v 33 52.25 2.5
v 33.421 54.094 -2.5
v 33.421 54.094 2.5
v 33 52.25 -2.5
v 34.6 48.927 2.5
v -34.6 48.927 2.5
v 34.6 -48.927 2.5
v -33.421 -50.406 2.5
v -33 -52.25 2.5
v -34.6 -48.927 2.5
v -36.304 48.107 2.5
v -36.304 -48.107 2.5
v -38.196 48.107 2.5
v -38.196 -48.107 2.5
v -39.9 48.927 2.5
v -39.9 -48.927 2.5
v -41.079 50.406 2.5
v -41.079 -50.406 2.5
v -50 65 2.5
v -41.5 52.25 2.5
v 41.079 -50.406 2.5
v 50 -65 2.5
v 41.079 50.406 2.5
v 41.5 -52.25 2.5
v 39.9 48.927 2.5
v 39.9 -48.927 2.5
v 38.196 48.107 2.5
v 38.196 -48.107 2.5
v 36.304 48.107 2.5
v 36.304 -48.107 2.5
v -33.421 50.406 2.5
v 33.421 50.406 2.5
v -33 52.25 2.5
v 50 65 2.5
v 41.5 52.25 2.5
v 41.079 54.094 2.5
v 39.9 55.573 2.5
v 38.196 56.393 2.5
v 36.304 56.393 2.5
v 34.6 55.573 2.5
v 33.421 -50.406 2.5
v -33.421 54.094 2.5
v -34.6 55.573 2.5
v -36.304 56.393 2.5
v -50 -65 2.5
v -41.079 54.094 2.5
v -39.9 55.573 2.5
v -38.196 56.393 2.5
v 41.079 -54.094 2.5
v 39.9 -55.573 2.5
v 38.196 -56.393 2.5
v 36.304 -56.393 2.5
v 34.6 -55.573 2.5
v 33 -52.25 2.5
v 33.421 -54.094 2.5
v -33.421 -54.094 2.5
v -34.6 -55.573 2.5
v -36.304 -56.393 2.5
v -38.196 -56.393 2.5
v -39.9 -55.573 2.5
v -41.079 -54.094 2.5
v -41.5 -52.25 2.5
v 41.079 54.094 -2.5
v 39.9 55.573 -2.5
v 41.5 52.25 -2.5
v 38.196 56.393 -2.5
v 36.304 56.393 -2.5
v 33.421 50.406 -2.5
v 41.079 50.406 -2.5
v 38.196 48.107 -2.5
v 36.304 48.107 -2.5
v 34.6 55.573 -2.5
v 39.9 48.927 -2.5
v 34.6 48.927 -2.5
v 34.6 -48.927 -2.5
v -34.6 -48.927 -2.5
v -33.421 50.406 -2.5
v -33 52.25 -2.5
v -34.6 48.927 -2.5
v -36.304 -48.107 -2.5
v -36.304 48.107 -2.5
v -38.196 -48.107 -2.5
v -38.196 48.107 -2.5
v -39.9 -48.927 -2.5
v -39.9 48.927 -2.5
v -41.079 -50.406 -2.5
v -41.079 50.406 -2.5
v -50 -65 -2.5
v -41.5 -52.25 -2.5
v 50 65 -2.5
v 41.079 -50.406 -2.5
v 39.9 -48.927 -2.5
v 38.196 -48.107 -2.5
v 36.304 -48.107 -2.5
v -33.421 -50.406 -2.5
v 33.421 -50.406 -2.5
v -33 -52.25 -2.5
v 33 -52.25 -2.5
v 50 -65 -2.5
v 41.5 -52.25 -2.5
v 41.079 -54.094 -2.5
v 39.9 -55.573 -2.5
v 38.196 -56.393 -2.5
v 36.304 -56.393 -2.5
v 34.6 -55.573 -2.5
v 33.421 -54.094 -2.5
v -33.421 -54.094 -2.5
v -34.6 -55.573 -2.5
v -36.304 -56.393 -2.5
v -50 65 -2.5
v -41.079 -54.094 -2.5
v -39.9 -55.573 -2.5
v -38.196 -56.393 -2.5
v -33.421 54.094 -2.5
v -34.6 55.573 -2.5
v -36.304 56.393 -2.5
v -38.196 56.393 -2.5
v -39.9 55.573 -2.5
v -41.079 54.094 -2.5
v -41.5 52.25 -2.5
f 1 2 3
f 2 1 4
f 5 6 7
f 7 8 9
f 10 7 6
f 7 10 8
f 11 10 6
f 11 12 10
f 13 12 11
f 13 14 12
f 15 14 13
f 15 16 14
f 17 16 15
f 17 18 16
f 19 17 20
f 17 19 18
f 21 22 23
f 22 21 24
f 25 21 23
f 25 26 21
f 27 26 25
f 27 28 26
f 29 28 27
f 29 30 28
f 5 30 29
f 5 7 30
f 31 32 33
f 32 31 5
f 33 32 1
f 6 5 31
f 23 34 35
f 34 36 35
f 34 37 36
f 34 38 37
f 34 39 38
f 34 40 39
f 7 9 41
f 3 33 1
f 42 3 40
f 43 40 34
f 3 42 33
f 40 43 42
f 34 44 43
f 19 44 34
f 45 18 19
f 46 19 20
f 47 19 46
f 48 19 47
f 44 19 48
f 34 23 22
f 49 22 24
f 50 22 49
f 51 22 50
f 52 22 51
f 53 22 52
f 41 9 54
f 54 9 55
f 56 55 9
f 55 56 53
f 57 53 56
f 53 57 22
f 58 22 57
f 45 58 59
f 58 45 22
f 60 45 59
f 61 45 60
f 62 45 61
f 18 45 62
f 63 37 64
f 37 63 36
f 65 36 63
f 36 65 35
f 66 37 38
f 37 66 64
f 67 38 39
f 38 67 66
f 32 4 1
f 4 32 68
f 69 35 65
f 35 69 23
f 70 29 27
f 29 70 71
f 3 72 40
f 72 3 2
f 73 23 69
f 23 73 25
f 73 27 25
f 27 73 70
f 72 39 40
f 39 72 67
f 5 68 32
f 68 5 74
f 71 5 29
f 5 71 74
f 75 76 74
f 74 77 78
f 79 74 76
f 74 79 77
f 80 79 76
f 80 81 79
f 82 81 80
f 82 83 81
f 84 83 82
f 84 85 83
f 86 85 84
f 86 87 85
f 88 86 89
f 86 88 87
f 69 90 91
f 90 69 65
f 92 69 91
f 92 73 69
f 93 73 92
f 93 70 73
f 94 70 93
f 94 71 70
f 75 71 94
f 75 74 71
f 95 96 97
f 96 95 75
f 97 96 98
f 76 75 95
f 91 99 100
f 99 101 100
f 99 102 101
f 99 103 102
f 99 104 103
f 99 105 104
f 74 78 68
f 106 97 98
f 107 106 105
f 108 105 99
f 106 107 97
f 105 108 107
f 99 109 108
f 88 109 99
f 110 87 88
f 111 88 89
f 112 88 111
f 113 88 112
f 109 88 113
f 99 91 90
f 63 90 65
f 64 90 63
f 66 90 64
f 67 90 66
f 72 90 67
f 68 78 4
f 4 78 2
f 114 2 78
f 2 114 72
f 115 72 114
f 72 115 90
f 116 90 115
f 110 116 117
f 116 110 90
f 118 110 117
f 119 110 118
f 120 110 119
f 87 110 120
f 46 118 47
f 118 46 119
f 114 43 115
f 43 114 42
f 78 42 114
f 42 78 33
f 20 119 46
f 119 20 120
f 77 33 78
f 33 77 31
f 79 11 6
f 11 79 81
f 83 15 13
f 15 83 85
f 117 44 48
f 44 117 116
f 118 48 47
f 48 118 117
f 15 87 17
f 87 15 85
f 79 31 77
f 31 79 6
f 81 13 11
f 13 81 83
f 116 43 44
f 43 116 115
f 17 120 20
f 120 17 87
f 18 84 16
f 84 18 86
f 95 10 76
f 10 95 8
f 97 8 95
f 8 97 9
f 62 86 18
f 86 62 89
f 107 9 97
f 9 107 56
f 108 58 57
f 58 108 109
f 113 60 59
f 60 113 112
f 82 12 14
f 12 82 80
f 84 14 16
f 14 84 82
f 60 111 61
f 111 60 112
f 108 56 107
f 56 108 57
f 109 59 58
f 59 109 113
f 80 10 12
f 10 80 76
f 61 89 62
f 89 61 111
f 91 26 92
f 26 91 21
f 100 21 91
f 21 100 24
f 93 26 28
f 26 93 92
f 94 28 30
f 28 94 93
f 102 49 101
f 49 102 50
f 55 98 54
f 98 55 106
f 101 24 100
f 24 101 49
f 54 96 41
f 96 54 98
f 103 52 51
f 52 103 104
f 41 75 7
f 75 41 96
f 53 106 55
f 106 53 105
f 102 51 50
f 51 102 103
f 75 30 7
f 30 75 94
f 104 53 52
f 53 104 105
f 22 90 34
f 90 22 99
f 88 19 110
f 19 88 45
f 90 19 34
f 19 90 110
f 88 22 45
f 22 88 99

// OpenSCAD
// Generated by SolidPython 1.1.3 on 2023-07-03 18:05:35


difference() {
	cube(center = true, size = [100, 130.0000000000, 5]);
	union() {
		translate(v = [37.2500000000, 52.2500000000]) {
			cylinder(center = true, h = 5, r = 4.2500000000);
		}
		translate(v = [-37.2500000000, 52.2500000000]) {
			cylinder(center = true, h = 5, r = 4.2500000000);
		}
		translate(v = [-37.2500000000, -52.2500000000]) {
			cylinder(center = true, h = 5, r = 4.2500000000);
		}
		translate(v = [37.2500000000, -52.2500000000]) {
			cylinder(center = true, h = 5, r = 4.2500000000);
		}
	}
}
/***********************************************
*********      SolidPython code:      **********
************************************************
 
import solid
import numbers
import pudb
from solid.utils import *
import viewscad
import subprocess
import os
import os.path as osp
import math
import sys

chamfer_extrude=solid.import_scad("./chamfer_extrude.scad")
chamfer_extrude=chamfer_extrude.chamfer_extrude
r = viewscad.Renderer(width=800, height=800)

def debug(model,f_name,path="/home/ts/code/projects/mfd/designs/debug"):
    solid.scad_render_to_file(model,osp.join(path,f_name)+".scad")
#generate position list of wells using offset from center
wells_pos_from_center_4 = lambda offset: [[-offset,offset],
                                        [offset, offset],
                                        [-offset, -offset],
                                        [offset, -offset]]
#wells_pos_from_center_2 = lambda offset: [[0,offset],
#                                        [0, -offset]]
wells_pos_from_center_2 = lambda offset: [[offset,0],
                                        [-offset,0]]

def make_well(dims,shape=None,height=None,dxf=False):
    def circle_cylinder():
        if dxf or (height is None):
            well = solid.circle(r=dims, segments=64)
        else:
            well = solid.cylinder(r=dims, h=height, segments=64, center = True)
        return well
    if dims is None:
        sys.exit("radius needs to be a number")
    if isinstance(dims, numbers.Number):
        well =circle_cylinder()
    elif len(dims)==1:
        if isinstance(dims[1], numbers.Number):
            well =circle_cylinder()
        else:
            sys.exit("radius needs to be a number")
    elif len(dims)==2:
        well = solid.square(dims,center = True)
    elif len(dims)==3:
        well = solid.cube(dims, center = True)
    return well

def wells_top_bottom(center_gap,device_dims=None,shape=None,height=None, positions = None, dxf = False):
    well_shape = make_well(device_dims,shape=shape,height=height,dxf=dxf)
    wells = []
    if positions is None:
        offset = radius+radius/2.0
        positions = wells_pos_from_center_2(offset)
    if dxf or (height is None):
        height = 0
    for position in positions:
        if dxf:
            wells.append(solid.translate([position[0],position[1]])(well_shape))
        else:
            wells.append(solid.translate([position[0],position[1],height/2.0])(well_shape))
    return  union()(*wells)

#place wells in four corners 
def four_corner(radius,height=None, positions = None, dxf = False):
    #if well pos not specified set
    #to equally spaced by half radius
    if positions is None:
        offset = radius+radius/2.0
        positions = wells_pos_from_center_4(offset)
    if dxf or (height is None):
        height = 0
    #make wells at positions with specified radius and height
    wells = []
    for position in positions:
        #make circle if making dxf
        if dxf:
            well_shape = solid.circle(r=radius, segments=64)
            well_shape = solid.translate([position[0],position[1]])(well_shape)
        #if stl make cylinder
        else:
            well_shape = solid.cylinder(r=radius, h=height, segments=64, center = True)
            well_shape = solid.translate([position[0],position[1],height/2.0])(well_shape)
        wells.append(well_shape)
    return  union()(*wells)

#generate channels 
def make_channels(length,width,height=0,num_chans=1,max_chans=None,spacing=None, dxf = False,
                  rotate_channels=False):
    if dxf or (height is None):
        height = 0
    #if channel gap not defined, is equal to
    if spacing is None: spacing = width
    #calculate number of channels if fitting max num within given width
    if not max_chans is None:
        import math
        num_chans = math.floor((max_chans-spacing)/(width+spacing))
    #get total width of channel section  
    total_width = (width*num_chans)+(spacing*(num_chans-1))

    #make template channel
    #if rotate_channels: width, length = length, width
    if dxf:
        channel_t = solid.square([length,width],center = True)
    else:
        channel_t = solid.cube([length,width,height], center = True)

    #if number channels is even, offset the first channel to center its gap
    if num_chans % 2 == 0: centering = -(width/2.0+spacing/2.0)
    else: centering = 0
    #move template channel up to align bottom at z = 0 
    #and offset center if necessary
    if dxf:
        channel_t = solid.translate([0,centering])(channel_t)
    else:
        channel_t = solid.translate([0,centering,height/2.0])(channel_t)

    #if rotate_channels: length,width = width,length
    #start making the channels
    channels = []
    for i in range(num_chans):
        #if i=0 there is no translation
        #if i=1, we make the first channel adjacent to second
        direction = i

        #if i>=1, we add channels alternating left and right
        if i >= 1:
            direction = -(i/2.0)
            if i % 2 == 1: direction = (-direction)+0.5
                
        #make channel at right position and add it to channel list
        translation_coords = [0,direction*(width+spacing)]
        #if rotate_channels: translation_coords = [direction*(width+spacing),0]
        if dxf:
            channel = solid.translate(translation_coords)(channel_t)
        else:
            channel = solid.translate([*translation_coords,0])(channel_t)
        channels.append(channel)
    
    #group all channels as one object
    channels = union()(*channels)
    #compute the x,y,z dimensions in order to pass as arguments 
    #for construction of other parts of device (such as the chambers)
    measurements = {'x':(length/2.0,-length/2.0),
                    'y':(total_width/2.0,-total_width/2.0)}
    if not dxf:
        measurements['z'] = (height,0)
    if rotate_channels:
        channels = solid.rotate(90)(channels)
        measurements['x'],measurements['y']=measurements['y'],measurements['x']
    return channels,measurements

def make_chambers(msrs,height=None,extra=0,len_until=None,width=None, dxf = False):
    #computes x,y,z length
    total = lambda x : abs(x[0]) + abs(x[1])
    
    #if specific height if specified
    #otherwise use same height as channels
    if dxf:
        pass
    elif not height is None:
        msrs['z'] = (height,0)
    else:
        msrs['z'] = (0,0)
        
    #make copy of measurements from channels to modify chamber dimensions 
    #and add length to chambers as specified
    chamber_dims = msrs.copy()
    #calculate length of chamber to reach specified offset
    if not len_until is None:
        chamber_len = len_until-(msrs['x'][0])
    #or add specified length to channel length (if not specified, adds 0)
    else:
        chamber_len = msrs['x'][0]+extra
    #set the chamber length based 
    chamber_dims['x'] = (chamber_len/2.0,-(chamber_len/2.0))
    #compute final dimensions of chamber
    if not width is None:
        chamber_dims['y'] = (width/2.0,-width/2.0)
    chamber_dims = [total(size) for size in chamber_dims.values()]
        
    #calculate chamber translation offset to place adjacent to channels
    chamber_trslt = msrs['x'][0]+(chamber_len/2.0)
    #compute chamber translation coordinates to align with channels
    #x = 1 moves chamber above channels
    #x = -1 moves chamber below channels
    if dxf:
        trslt = lambda x : [x*(chamber_trslt),0]
    else:
        trslt = lambda x : [x*(chamber_trslt),0,msrs['z'][0]/2.0]
    
    #function to make chamber at top or at bottom 
    if dxf:
        move = lambda x : solid.translate(trslt(x))(solid.square(chamber_dims, center = True) )
    else:
        move = lambda x : solid.translate(trslt(x))(solid.cube(chamber_dims,center = True))
    #make top and bottom chambers and return them as grouped
    top = move(1)
    bottom = move(-1)
    #chambers=solid.rotate(90)(solid.union()(top,bottom))
    chambers=(solid.union()(top,bottom))

    return chambers

#create alignment features 
def alignment_features(unit,dims,grid_size, mask_size = None, alignment = "hollow", units_from_center = (2.5,2.5), corner_len=None):
    width = grid_size[0]*dims[0]
    length = grid_size[1]*dims[1]
    if mask_size is None and corner_len is None:
        corner_len = (dims[0] + dims[1]) /2 / 8
    corner = lambda thickness_div : solid.union()( solid.square([corner_len,corner_len/thickness_div],center=False), solid.square([corner_len/thickness_div,corner_len],center=False) )
    
    def make_full(thickness_div):
        thickness = corner_len/thickness_div
        tr = solid.translate([0, 0, 0 ])(solid.rotate(180)(corner(thickness_div)))
        tr = solid.translate([thickness/2,thickness/2,0])(tr)
        bl = solid.translate([0, 0, 0 ])(solid.rotate(0)(corner(thickness_div)))
        bl = solid.translate([-thickness/2,-thickness/2,0])(bl)
        return solid.union()(tr,bl)
    
    def make_hollow(thickness_div):
        thickness = corner_len/(thickness_div/2)
        inner = make_full(thickness_div)
        outer = make_full(thickness_div/2)
        hollow = outer - inner 
        return hollow
    
    center = (width /2 , length/2)
    mask_pos = lambda x,y : (center[0] + x*(float(units_from_center[0])*dims[0]), center[1] + y*(float(units_from_center[1])*dims[1]))
    positions = []
    positions.append(mask_pos(1,0))
    positions.append(mask_pos(0,1))
    positions.append(mask_pos(-1,0))
    positions.append(mask_pos(0,-1))
    make_mask = lambda mtype : make_hollow(8) if mtype == "hollow" else make_full(8)
    masks = [ solid.translate([*position,0])(make_mask(alignment)) for position in positions]
    
    solid.scad_render_to_file(solid.union()(*masks),"./designs/open_chamber/masks.scad")
    #return unit - solid.union()(*masks)
    return solid.union()(*masks,unit)

def create_outline(thickness, array, dims, grid_size,):
    width = grid_size[0]*dims[0] + thickness *2
    length = grid_size[1]*dims[1] + thickness *2
    outer = solid.translate([-thickness, -thickness,0])(solid.square([width, length]))
    return outer-array

def create_wall(wall_thickness, outline_thickness, dims, grid_size, wall_height = 2000, dxf = False):
    inner_width = grid_size[0]*dims[0] + outline_thickness *2
    inner_length = grid_size[1]*dims[1] + outline_thickness *2
    outer_width = inner_width + wall_thickness * 2
    outer_length = inner_length + wall_thickness * 2
    outer_pos_x = -outline_thickness-wall_thickness
    outer_pos_y = -outline_thickness-wall_thickness
    inner_pos_x = -outline_thickness
    inner_pos_y = -outline_thickness
    if dxf:
        inner_wall = solid.translate([inner_pos_x,
                                      inner_pos_y,
                                      0])(solid.square([inner_width, inner_length]))
        outer_wall = solid.translate([outer_pos_x,
                                      outer_pos_y,
                                      0])(solid.square([outer_width, outer_length]))

        return outer_wall-inner_wall
    else:
        inner_wall = solid.translate([inner_pos_x,
                                      inner_pos_y,
                                      0])(solid.cube([inner_width, inner_length,wall_height]))
        outer_wall = solid.translate([outer_pos_x,
                                      outer_pos_y,
                                      0])(solid.cube([outer_width, outer_length,wall_height]))

        return outer_wall-inner_wall, {'wall_height': wall_height,
                                       'wall_thickness': wall_thickness,
                                       'inner_width':inner_width,
                                       'inner_length': inner_length,
                                       'outer_width': outer_width,
                                       'outer_length': outer_length,
                                       'outer_pos_x' : outer_pos_x,
                                       'outer_pos_y' : outer_pos_y,
                                       'inner_pos_x' : inner_pos_x,
                                       'inner_pos_y' : inner_pos_y}

def create_thicker_wall(wall_thickness, outer_wall_offset, wall_dims, dims, grid_size, height_start = .2, height_end=2, dxf = False):
    addon_wall,thicker_wall_dims = create_wall(wall_thickness, outer_wall_offset, dims, grid_size, wall_height=height_end-height_start, dxf = False)
    addon_wall = solid.translate([0,0,height_start])(addon_wall)

    thicker_wall_dims['wall_height'] = height_end
    thicker_wall_dims['wall_thickness'] = wall_dims['wall_thickness'] + wall_thickness
    return addon_wall, thicker_wall_dims
 
def add_lock_to_wall(wall,wall_dims,y_offset = 0,cut_ratio=0.7,L_length=3, gap_ratio=0.05, axis="x",width_ratio=1/2):
    # Makes L shape
    def make_L(max_length,length_thickness,max_width,width_thickness,height,y_offset):
        length = solid.cube([max_length,length_thickness,height])
        width = solid.cube([width_thickness,max_width,height])
        width = solid.translate([max_length-(width_thickness),0,0])(width)
        L = solid.union()(width,length)
        debug(L,"L")
        if axis == "x":
            L = solid.rotate(-90)(L)
            L = solid.translate([0,max_length,0])(L)
        else:
            L = solid.rotate(-180)(L)
            L = solid.translate([max_length,max_width,0])(L)
        return solid.translate([0,0,y_offset])(L)
    
    lock_length = L_length
    lock_width = wall_dims['wall_thickness']*width_ratio
    lock_length_thickness = lock_width/2
    lock_width_thickness = lock_width/2
    L_lock = make_L(lock_length,lock_length_thickness,lock_width,lock_width_thickness, wall_dims['wall_height']-y_offset, y_offset)
    
    margin_space = lock_length - lock_length*(1-gap_ratio)
    key_length = lock_length-margin_space
    key_length_thickness = lock_length_thickness-(margin_space*2)
    key_width = lock_width-(margin_space*2)
    key_width_thickness = lock_width_thickness-(margin_space*2)
    L_key = make_L(key_length,key_length_thickness,key_width,key_width_thickness, wall_dims['wall_height']-y_offset, y_offset)
    L_key = solid.translate([margin_space,margin_space,0])(L_key)
    L = solid.union()(L_lock,L_key)
    debug(L,"L")
    
    #Make cube to be used as negative to split frame in a half
    #Can choose if making left or right negative, specify ratio of split
    def make_negative(right,cut_ratio):
        if axis == "x":
            if right:
                length = wall_dims['outer_length']*(1-cut_ratio)
                pos_x = wall_dims['outer_pos_x']+(wall_dims['outer_length']*cut_ratio)
            else:
                length = wall_dims['outer_length']*(cut_ratio)
                pos_x = wall_dims['outer_pos_x'] 
            negative = solid.cube([wall_dims['outer_width'],length, wall_dims['wall_height']])
            negative = solid.translate([wall_dims['outer_pos_y'],pos_x,0])(negative)
        else:
            if right:
                length = wall_dims['outer_width']*(1-cut_ratio)
                pos_x = wall_dims['outer_pos_y']+(wall_dims['outer_width']*cut_ratio)
            else:
                length = wall_dims['outer_width']*(cut_ratio)
                pos_x = wall_dims['outer_pos_y'] 
            negative = solid.cube([length,wall_dims['outer_length'], wall_dims['wall_height']])
            negative = solid.translate([pos_x,wall_dims['outer_pos_x'],0])(negative)
        return negative, pos_x, length 
                      
    #Make negatives
    negative_right, right_half_pos_x, right_half_length = make_negative(True,cut_ratio)
    negative_left, left_half_pos_x, right_half_length = make_negative(False,cut_ratio)
    #Make halves
    left_half = solid.difference()(wall,negative_right)
    right_half = solid.difference()(wall,negative_left)
    def place_L(L, L_length,L_width):
        #Place L on top wall       
        offset_to_center = (wall_dims['wall_thickness']-L_width)/2
        if axis == "x":
            y_pos_top = (wall_dims['outer_pos_y'] +
                    wall_dims['outer_width'] - 
                    L_width - offset_to_center)
            top_L = solid.translate([y_pos_top,
                                     right_half_pos_x-(L_length),
                                     0])(L)
            #Place L on bottom wall       
            y_pos_bottom = wall_dims['outer_pos_y']+offset_to_center
            bottom_L = solid.translate([y_pos_bottom,
                                        right_half_pos_x-L_length,
                                        0])(L)
        else:
            y_pos_top = (wall_dims['outer_pos_x'] +
                    wall_dims['outer_length'] -
                    (L_width+offset_to_center))
            top_L = solid.translate([right_half_pos_x-L_length,
                                     y_pos_top,
                                     0])(L)
            #Place L on bottom wall       
            y_pos_bottom = wall_dims['outer_pos_y']+offset_to_center
            bottom_L = solid.translate([right_half_pos_x-L_length,
                                        y_pos_bottom,
                                        0])(L)
        return bottom_L, top_L
    #Make complimentary L pieces through union and differences
    #Make Lock
    bottom_L_lock, top_L_lock = place_L(L_lock,L_length,lock_width)
    left_half = solid.difference()(left_half,bottom_L_lock)
    left_half = solid.difference()(left_half,top_L_lock)
    #Make Key
    bottom_L_key, top_L_key = place_L(L_key,L_length,lock_width)
    right_half = solid.union()(right_half,bottom_L_key)
    right_half = solid.union()(right_half,top_L_key)
    return left_half, right_half


#build a row x col grid of containment units
def make_unit_array(unit,dims,grid_size, dxf = False, alignment = None, mask_size = None,
                    units_from_center = None,alignment_offset=None, alignment_mark_size=1):
    units = []
    for col in range(grid_size[1]):
        for row in range(grid_size[0]):
            if dxf:
                units.append(solid.translate([row*dims[0],col*dims[1]])(unit))
            else:
                units.append(solid.translate([row*dims[0],col*dims[1],dims[2]/2.0])(unit))
    array = solid.union()(*units)
    if (not alignment is None) and dxf:
        if not alignment_offset is None:
            array = solid.translate([alignment_offset[0],alignment_offset[1]])(array)
        array = alignment_features(array,dims, grid_size, alignment = alignment, mask_size = None, units_from_center = units_from_center,corner_len=alignment_mark_size)
        if not alignment_offset is None:
            array = solid.translate([-alignment_offset[0],-alignment_offset[1]])(array)
    return array


def make_taylor(wells_pos = wells_pos_from_center_4(2.25), well_rad = 1.5 ,
                well_height = 2, chan_w = 0.01, chan_l = 1, chan_h = 0.010 ,
                chan_gap = 0.040, max_chans = None,num_chans=100, chamber_height  = 0.100,
                columns = 1, rows = 1, chamber_len_until=2.25, add_channels = True, add_wells = True, 
                add_chambers = True, save_path = "./", alignment = None, units_from_center = 2,
                mask_size = None, render_stl = False, outline_thickness = 0.050, dxf = True,
                wall_height = 15, wall_thickness = 0.95, casing_x=9, casing_y=9, casing_z=0,rotate_units=0):

    dims = [casing_x, casing_y, casing_z]
    wells = four_corner(well_rad,well_height, dxf = dxf, positions = wells_pos)
    debug(wells,"wells")
    channels, msrs = make_channels(chan_l,chan_w,chan_h,dxf=dxf, spacing = chan_gap, max_chans=max_chans,num_chans=num_chans)
    debug(channels,"channels")
    chambers = make_chambers(msrs,dxf = dxf, height=chamber_height,len_until=chamber_len_until)
    debug(chambers,"chambers")

    #add together and render
    device_parts = []
    if add_channels:
        device_parts.append(channels)
    if add_wells:
        device_parts.append(wells)
    if add_chambers:
        device_parts.append(chambers)
    device=union()(*device_parts)
    device = rotate(rotate_units)(device)

    device=solid.translate([dims[0]/2.0,dims[1]/2.0,0])(device)
    channels = rotate(rotate_units)(channels)
    channels=solid.translate([dims[0]/2,dims[1]/2,0])(channels)
    chambers_wells = union()(wells,chambers)
    chambers_wells = rotate(rotate_units)(chambers_wells)
    chambers_wells=solid.translate([dims[0]/2,dims[1]/2,0])(chambers_wells)

    file_name = str(rows)+'x'+str(columns)+'_units_'
    grid_size = [rows,columns]

    if alignment:
        alignment="full"
    device = make_unit_array(device,dims,grid_size, dxf=dxf, alignment = alignment,
                                 units_from_center = units_from_center)
    channels = make_unit_array(channels,dims,grid_size, dxf=dxf, alignment = alignment,
                                 units_from_center = units_from_center)
    if alignment=="full":
        alignment="hollow"

    chambers_wells = make_unit_array(chambers_wells,dims,grid_size, dxf=dxf, alignment = alignment,
                                 units_from_center =units_from_center)

    def save_model(model,prefix):
        model_fname = os.path.abspath(save_path+prefix+"_"+file_name+".scad")
        solid.scad_render_to_file(model,model_fname)
        return model_fname

    wells_fname = save_model(wells,"wells")
    channels_fname = save_model(channels,"channels")
    device_fname = save_model(device,"device")
    chambers_wells_fname = save_model(chambers_wells,"chambers_wells")
    return (chambers_wells,chambers_wells_fname), (channels,channels_fname), (device,device_fname)

def make_device(design='open',rows=8,columns=6,wells_pos = 4.5,well_offset=3.2, well_rad=3.2,well_height=0.1,
                chan_l=1,chan_w=0.01,chan_h=0.01,chan_gap=0.015,num_chans=101,dxf=True,save_path="./designs/open_chamber/",
                casing_x=9.0,casing_y=18.0,casing_z=0,rotate_units=90,units_from_center=(3,1),chamber_len_until=4.5,
                chamber_width=None,alignment=True, add_wells=True, add_channels=True,add_chambers=True):

    dims = [casing_x, casing_y, casing_z]
    if design == "open":
        wells_pos=wells_pos_from_center_2(wells_pos)
        wells = wells_top_bottom(well_offset*2,device_dims=well_rad,height=well_height, dxf = dxf, positions = wells_pos)
    elif design == "closed":
        wells_pos=wells_pos_from_center_4(wells_pos)
        debug(wells,"wells")
        wells = four_corner(well_offset,well_heightdevice_dims=well_rad, dxf = dxf, positions = wells_pos)
    else:
        print(design+" is not a valid design.\n Choose valid design: 'open' or 'closed'")
        exit()
    wells = rotate(rotate_units)(wells)
    wells=solid.translate([dims[0]/2,dims[1]/2,0])(wells)
    debug(wells,"wells")

    channels, msrs = make_channels(chan_l,chan_w,chan_h,dxf=dxf, spacing = chan_gap, num_chans=num_chans,rotate_channels=False)
    channels = rotate(rotate_units)(channels)
    channels=solid.translate([dims[0]/2,dims[1]/2,0])(channels)

    chambers=make_chambers(msrs,height=None,extra=0,len_until=chamber_len_until, width=chamber_width,dxf = dxf)
    chambers = rotate(rotate_units)(chambers)
    chambers=solid.translate([dims[0]/2,dims[1]/2,0])(chambers)

    device_parts = []
    if add_channels:
        device_parts.append(channels)
    if add_wells:
        device_parts.append(wells)
    if add_chambers:
        device_parts.append(chambers)
    device = union()(*device_parts)
    #device = rotate(rotate_units)(device)
    #device=solid.translate([dims[0]/2.0,dims[1]/2.0,0])(device)

    chambers_wells = []
    if add_chambers:
        chambers_wells.append(chambers)
    if add_wells:
        chambers_wells.append(wells)
    chambers_wells = union()(*chambers_wells)
    #chambers_wells = union()(wells,chambers)
    #chambers_wells = rotate(rotate_units)(chambers_wells)
    #chambers_wells=solid.translate([dims[0]/2,dims[1]/2,0])(chambers_wells)

    file_name = str(rows)+'x'+str(columns)+'_units_'

    grid_size = [rows,columns]
    if alignment:
        alignment="full"
    device = make_unit_array(device,dims,grid_size, dxf=dxf, alignment = alignment,
                                 units_from_center = units_from_center)
    channels = make_unit_array(channels,dims,grid_size, dxf=dxf, alignment = alignment,
                                 units_from_center = units_from_center)
    if alignment=="full":
        alignment="hollow"

    chambers_wells = make_unit_array(chambers_wells,dims,grid_size, dxf=dxf, alignment = alignment,
                                 units_from_center =units_from_center)

    def save_model(model,prefix):
        model_fname = os.path.abspath(save_path+prefix+"_"+file_name+".scad")
        solid.scad_render_to_file(model,model_fname)
        return model_fname

    wells_fname = save_model(wells,"wells")
    channels_fname = save_model(channels,"channels")
    device_fname = save_model(device,"device")
    chambers_wells_fname = save_model(chambers_wells,"chambers_wells")
    return (chambers_wells,chambers_wells_fname), (channels,channels_fname), (device,device_fname)


def make_open_chamber(rows=8,columns=6,wells_pos = wells_pos_from_center_2(4.5), well_rad=3.2,well_height=0.1,
                      chan_l=1,chan_w=0.01,chan_h=0.01,chan_gap=0.015,num_chans=101,dxf=True,save_path="./designs/open_chamber/",
                      casing_x=9.0,casing_y=18.0,casing_z=0,rotate_units=90,units_from_center=(3,1),chamber_len_until=4.5,
                      chamber_width=None,alignment=True, add_wells=True, add_channels=True,add_chambers=True):

    dims = [casing_x, casing_y, casing_z]
    wells = wells_top_bottom(well_rad,height=well_height, dxf = dxf, positions = wells_pos)
    channels, msrs = make_channels(chan_l,chan_w,chan_h,dxf=dxf, spacing = chan_gap, num_chans=num_chans,rotate_channels=False)
    chambers=make_chambers(msrs,height=None,extra=0,len_until=chamber_len_until, width=chamber_width,dxf = dxf)
    debug(chambers,"chambers")
    device_parts = []
    if add_channels:
        device_parts.append(channels)
    if add_wells:
        device_parts.append(wells)
    if add_chambers:
        device_parts.append(chambers)
    device = union()(*device_parts)
    device = rotate(rotate_units)(device)
    device=solid.translate([dims[0]/2.0,dims[1]/2.0,0])(device)
    channels = rotate(rotate_units)(channels)
    channels=solid.translate([dims[0]/2,dims[1]/2,0])(channels)
    chambers_wells = union()(wells,chambers)
    chambers_wells = rotate(rotate_units)(chambers_wells)
    chambers_wells=solid.translate([dims[0]/2,dims[1]/2,0])(chambers_wells)

    file_name = str(rows)+'x'+str(columns)+'_units_'

    grid_size = [rows,columns]
    if alignment:
        alignment="full"
    device = make_unit_array(device,dims,grid_size, dxf=dxf, alignment = alignment,
                                 units_from_center = units_from_center)
    channels = make_unit_array(channels,dims,grid_size, dxf=dxf, alignment = alignment,
                                 units_from_center = units_from_center)
    if alignment=="full":
        alignment="hollow"

    chambers_wells = make_unit_array(chambers_wells,dims,grid_size, dxf=dxf, alignment = alignment,
                                 units_from_center =units_from_center)

    def save_model(model,prefix):
        model_fname = os.path.abspath(save_path+prefix+"_"+file_name+".scad")
        solid.scad_render_to_file(model,model_fname)
        return model_fname

    wells_fname = save_model(wells,"wells")
    channels_fname = save_model(channels,"channels")
    device_fname = save_model(device,"device")
    chambers_wells_fname = save_model(chambers_wells,"chambers_wells")
    return (chambers_wells,chambers_wells_fname), (channels,channels_fname), (device,device_fname)

def to_dxf(scad_path):
    dxf_path = scad_path.replace(".scad",".dxf")
    subprocess.call(["openscad", "-o", dxf_path, scad_path])
    import ezdxf
    temp_dxf = ezdxf.readfile(dxf_path)
    temp_dxf.saveas(dxf_path)

#def make_walls(diameter,thickness,grid_size,dims,height=20,segments=256,make_inner=True):
#    wafer_wall_out = solid.cylinder(r=diameter/2,h=height, segments=segments)
#    wafer_wall_in = solid.cylinder(r=(diameter/2-thickness),h=height, segments=segments)
#    wafer_wall = solid.difference()(wafer_wall_out,wafer_wall_in)
#    wafer_wall = solid.translate([grid_size[1]*dims[1]/2.0,grid_size[0]*dims[0]/2.0])(wafer_wall)
#
#    vertical_wall_length = grid_size[1]*dims[1]
#    horizontal_wall_length = grid_size[0]*dims[0]
#    vertical_wall = solid.cube([vertical_wall_length,thickness,height],center = True)
#    vertical_wall = solid.translate([vertical_wall_length/2,0,height/2])(vertical_wall)
#    horizontal_wall = solid.cube([thickness,horizontal_wall_length,height],center = True)
#    horizontal_wall = solid.translate([0,vertical_wall_length/2,height/2])(horizontal_wall)
#    walls = []
#    walls.append(horizontal_wall)
#    walls.append(vertical_wall)
#    for col in range(grid_size[1]):
#        if col == grid_size[1]-1: 
#            walls.append(solid.translate([0,(col+1)*dims[1]])(vertical_wall))
#        elif col > 0 and col < grid_size[1]-1 and make_inner==True:
#            walls.append(solid.translate([0,(col+1)*dims[1]])(vertical_wall))
#    for row in range(grid_size[0]):
#        if row == grid_size[0]-1: 
#            walls.append(solid.translate([(row+1)*dims[0],0])(horizontal_wall))
#        elif row > 0 and row < grid_size[0]-1 and make_inner==True:
#            walls.append(solid.translate([(row+1)*dims[0],0])(horizontal_wall))
#    walls = union()(*walls)
#    wafer_walls = union()(walls,wafer_wall)
#    return walls,wafer_wall,wafer_walls

def make_walls(diameter,thickness,grid_size,dims,height=20,segments=256,make_inner=True,padx=0,pady=0):
    wafer_wall_out = solid.cylinder(r=diameter/2,h=height, segments=segments)
    wafer_wall_in = solid.cylinder(r=(diameter/2-thickness),h=height, segments=segments)
    wafer_wall = solid.difference()(wafer_wall_out,wafer_wall_in)
    wafer_wall = solid.translate([grid_size[1]*dims[1]/2.0,grid_size[0]*dims[0]/2.0])(wafer_wall)

    vertical_wall_length = grid_size[0]*dims[0]+padx
    horizontal_wall_length = grid_size[1]*dims[1]+pady
    vertical_wall = solid.cube([vertical_wall_length,thickness,height],center = True)
    vertical_wall = solid.translate([vertical_wall_length/2-pady/2,-padx/2,height/2])(vertical_wall)
    horizontal_wall = solid.cube([thickness,horizontal_wall_length,height],center = True)
    horizontal_wall = solid.translate([-pady/2,horizontal_wall_length/2-padx/2,height/2])(horizontal_wall)
    walls = []
    walls.append(horizontal_wall)
    walls.append(vertical_wall)
    for col in range(grid_size[1]):
        if col == grid_size[1]-1: 
            walls.append(solid.translate([0,(col+1)*dims[1]+pady])(vertical_wall))
        elif col > 0 and col < grid_size[1]-1 and make_inner==True:
            walls.append(solid.translate([0,(col+1)*dims[1]])(vertical_wall))
    for row in range(grid_size[0]):
        if row == grid_size[0]-1: 
            walls.append(solid.translate([(row+1)*dims[0]+padx,0])(horizontal_wall))
        elif row > 0 and row < grid_size[0]-1 and make_inner==True:
            walls.append(solid.translate([(row+1)*dims[0],0])(horizontal_wall))
    walls = union()(*walls)
    wafer_walls = union()(walls,wafer_wall)
    return walls,wafer_wall,wafer_walls

def save_model(model,base_path,base_name,dxf=True):
    if not os.path.exists(base_path):
        os.makedirs(base_path)
    dxf_path=osp.join(base_path,base_name+".scad")
    solid.scad_render_to_file(model,osp.join(dxf_path))
    if dxf:
        to_dxf(dxf_path)

def make_wafer(diameter,flat_len,thickness):
    wafer = solid.cylinder(r1=diameter/2,r2=diameter/2,h=thickness,segments=512,)()
    x_start_flat=(flat_len/2)
    y_start_flat = math.sqrt(((diameter/2)**2) - (x_start_flat**2) )
    height_delete_flat=diameter/2-y_start_flat
    flat_delete = solid.cube([flat_len,height_delete_flat,thickness],center=False)()
    flat_delete = solid.translate([-flat_len/2,y_start_flat,0])(flat_delete)
    wafer = solid.difference()(wafer,flat_delete)
    wafer = solid.rotate(90)(wafer)
    return wafer

def add_wafer_to_mask(wafer_size,flat_len,mask,grid_size,dims,wafer_line_thickness=0.1,outer_mask_thickness=5,alignment_offset=None):
    def make_wafer_mask(wafer_size,flat_len):
        wafer_mask = make_wafer(wafer_size,flat_len,1)
        wafer_mask = solid.projection()(wafer_mask)
        wafer_mask = solid.translate([grid_size[0]*dims[0]/2.0,grid_size[1]*dims[1]/2.0])(wafer_mask)
        if not alignment_offset is None:
            wafer_mask = solid.translate([-alignment_offset[0],-alignment_offset[1]])(wafer_mask)
        return wafer_mask

    inner_wafer_line_mask = make_wafer_mask(wafer_size-wafer_line_thickness/2,flat_len)
    outer_wafer_line_mask = make_wafer_mask(wafer_size+wafer_line_thickness/2,flat_len)
    outer_wafer_mask = make_wafer_mask(wafer_size+outer_mask_thickness,flat_len)
    outer_wafer_mask = solid.difference()(outer_wafer_mask,outer_wafer_line_mask)
    wafer_mask = solid.union()(outer_wafer_mask,inner_wafer_line_mask)

    return solid.difference()(wafer_mask,mask)

def make_posts(post_shape,post_height):
    posts = solid.linear_extrude(height=post_height)(post_shape)
    return posts

def make_wafer_empty(diameter,flat_len,thickness,margin,notch_len=20,notch_height=5,oversize=1.01):
    diameter*=oversize
    flat_len*=oversize
    wafer = make_wafer(diameter,flat_len,thickness)
    holder = solid.cylinder(r1=diameter/2+margin,r2=diameter/2+margin,h=thickness,segments=512)()
    holder = solid.difference()(holder,wafer)

    x_start_flat=(flat_len/2)
    y_start_flat = math.sqrt(((diameter/2)**2) - (x_start_flat**2) )
    height_delete_flat=diameter/2-y_start_flat
    notch = solid.cube([notch_len,notch_height,thickness],center=False)()
    notch = solid.translate([-notch_len/2,y_start_flat,0])(notch)
    notch = solid.rotate(90)(notch)
    return solid.difference()(holder,notch)

def wafer_print_calibration(diameter,thickness,height,z_offset):
    circles = []
    radii = []
    radii.append(diameter/2.0*0.8)
    radii.append(diameter/2.0*0.6)
    radii.append(diameter/2.0*0.4)
    radii.append(diameter/2.0*0.2)
    for radius in radii:
        inner = solid.cylinder(r1=radius-(thickness/2.0),r2=radius-(thickness/2.0),h=thickness,segments=512,)()
        outer = solid.cylinder(r1=radius+(thickness/2.0),r2=radius+(thickness/2.0),h=thickness,segments=512,)()
        diff = solid.difference()(outer,inner)
        circles.append(diff)
    circles = solid.union()(*circles)
    circles = solid.translate([0,0,z_offset])(circles)
    return circles

def make_rack(wells,dims,grid_size,alignment_offset,rack_x,rack_y,rack_thickness,bolt_width,add_bolts=True):

    #get X and Y dimensions of gride of pipette tips
    X_len = dims[0]*grid_size[0]
    Y_len = dims[1]*grid_size[1]
    #make rack
    rack = solid.cube([rack_x,rack_y,rack_thickness],center=True)

    if add_bolts:
    #add bolt holes
        bolt_hole=solid.cylinder(r=bolt_width/2,h=rack_thickness,center=True)()
        bolt_holes = []
        bolt_holes.append(solid.translate([rack_x/2-1.5*bolt_width,rack_y/2-1.5*bolt_width])(bolt_hole))
        bolt_holes.append(solid.translate([-rack_x/2+1.5*bolt_width,rack_y/2-1.5*bolt_width])(bolt_hole))
        bolt_holes.append(solid.translate([-rack_x/2+1.5*bolt_width,-rack_y/2+1.5*bolt_width])(bolt_hole))
        bolt_holes.append(solid.translate([rack_x/2-1.5*bolt_width,-rack_y/2+1.5*bolt_width])(bolt_hole))
        bolt_holes = solid.union()(*bolt_holes)
        rack=solid.difference()(rack,bolt_holes)
    rack_support = rack

    #center rack with pipette holes
    rack = solid.translate([0,0,rack_thickness/2])(rack)
    rack = solid.translate([X_len/2,Y_len/2])(rack)
    rack = solid.translate([-alignment_offset[0],-alignment_offset[1]])(rack)
    wells = solid.linear_extrude(height=rack_thickness)(wells)
    rack = solid.difference()(rack,wells)
    return rack, rack_support

def make_pillar(wells,dims,grid_size,alignment_offset,rack_x,rack_y,pillar_height,rack_thickness,bolt_width,add_bolts=True,taper_angle=1,bolt_position_corner=1.5):

    #get X and Y dimensions of gride of pipette tips
    X_len = dims[0]*grid_size[0]
    Y_len = dims[1]*grid_size[1]
    #make rack
    rack = solid.cube([rack_x,rack_y,rack_thickness],center=True)
    
    if add_bolts:
    #add bolt holes
        bolt_hole=solid.cylinder(r=bolt_width/2,h=rack_thickness,center=True)()
        bolt_holes = []
        bolt_holes.append(solid.translate([rack_x/2-bolt_position_corner*bolt_width,rack_y/2-bolt_position_corner*bolt_width])(bolt_hole))
        bolt_holes.append(solid.translate([-rack_x/2+bolt_position_corner*bolt_width,rack_y/2-bolt_position_corner*bolt_width])(bolt_hole))
        bolt_holes.append(solid.translate([-rack_x/2+bolt_position_corner*bolt_width,-rack_y/2+bolt_position_corner*bolt_width])(bolt_hole))
        bolt_holes.append(solid.translate([rack_x/2-bolt_position_corner*bolt_width,-rack_y/2+bolt_position_corner*bolt_width])(bolt_hole))
        bolt_holes = solid.union()(*bolt_holes)
        rack=solid.difference()(rack,bolt_holes)
    rack_support = rack

    #center rack with pipette holes
    #rack = solid.translate([0,0,-rack_thickness])(rack)
    rack = solid.translate([X_len/2,Y_len/2])(rack)
    rack = solid.translate([-alignment_offset[0],-alignment_offset[1]])(rack)
    if not taper_angle == 0:
        wells=chamfer_extrude(pillar_height,taper_angle,segments=20)(wells)
    else:
        wells = solid.linear_extrude(height=pillar_height)(wells)
    rack = solid.union()(rack,wells)
    return rack, rack_support









 
 
************************************************/
